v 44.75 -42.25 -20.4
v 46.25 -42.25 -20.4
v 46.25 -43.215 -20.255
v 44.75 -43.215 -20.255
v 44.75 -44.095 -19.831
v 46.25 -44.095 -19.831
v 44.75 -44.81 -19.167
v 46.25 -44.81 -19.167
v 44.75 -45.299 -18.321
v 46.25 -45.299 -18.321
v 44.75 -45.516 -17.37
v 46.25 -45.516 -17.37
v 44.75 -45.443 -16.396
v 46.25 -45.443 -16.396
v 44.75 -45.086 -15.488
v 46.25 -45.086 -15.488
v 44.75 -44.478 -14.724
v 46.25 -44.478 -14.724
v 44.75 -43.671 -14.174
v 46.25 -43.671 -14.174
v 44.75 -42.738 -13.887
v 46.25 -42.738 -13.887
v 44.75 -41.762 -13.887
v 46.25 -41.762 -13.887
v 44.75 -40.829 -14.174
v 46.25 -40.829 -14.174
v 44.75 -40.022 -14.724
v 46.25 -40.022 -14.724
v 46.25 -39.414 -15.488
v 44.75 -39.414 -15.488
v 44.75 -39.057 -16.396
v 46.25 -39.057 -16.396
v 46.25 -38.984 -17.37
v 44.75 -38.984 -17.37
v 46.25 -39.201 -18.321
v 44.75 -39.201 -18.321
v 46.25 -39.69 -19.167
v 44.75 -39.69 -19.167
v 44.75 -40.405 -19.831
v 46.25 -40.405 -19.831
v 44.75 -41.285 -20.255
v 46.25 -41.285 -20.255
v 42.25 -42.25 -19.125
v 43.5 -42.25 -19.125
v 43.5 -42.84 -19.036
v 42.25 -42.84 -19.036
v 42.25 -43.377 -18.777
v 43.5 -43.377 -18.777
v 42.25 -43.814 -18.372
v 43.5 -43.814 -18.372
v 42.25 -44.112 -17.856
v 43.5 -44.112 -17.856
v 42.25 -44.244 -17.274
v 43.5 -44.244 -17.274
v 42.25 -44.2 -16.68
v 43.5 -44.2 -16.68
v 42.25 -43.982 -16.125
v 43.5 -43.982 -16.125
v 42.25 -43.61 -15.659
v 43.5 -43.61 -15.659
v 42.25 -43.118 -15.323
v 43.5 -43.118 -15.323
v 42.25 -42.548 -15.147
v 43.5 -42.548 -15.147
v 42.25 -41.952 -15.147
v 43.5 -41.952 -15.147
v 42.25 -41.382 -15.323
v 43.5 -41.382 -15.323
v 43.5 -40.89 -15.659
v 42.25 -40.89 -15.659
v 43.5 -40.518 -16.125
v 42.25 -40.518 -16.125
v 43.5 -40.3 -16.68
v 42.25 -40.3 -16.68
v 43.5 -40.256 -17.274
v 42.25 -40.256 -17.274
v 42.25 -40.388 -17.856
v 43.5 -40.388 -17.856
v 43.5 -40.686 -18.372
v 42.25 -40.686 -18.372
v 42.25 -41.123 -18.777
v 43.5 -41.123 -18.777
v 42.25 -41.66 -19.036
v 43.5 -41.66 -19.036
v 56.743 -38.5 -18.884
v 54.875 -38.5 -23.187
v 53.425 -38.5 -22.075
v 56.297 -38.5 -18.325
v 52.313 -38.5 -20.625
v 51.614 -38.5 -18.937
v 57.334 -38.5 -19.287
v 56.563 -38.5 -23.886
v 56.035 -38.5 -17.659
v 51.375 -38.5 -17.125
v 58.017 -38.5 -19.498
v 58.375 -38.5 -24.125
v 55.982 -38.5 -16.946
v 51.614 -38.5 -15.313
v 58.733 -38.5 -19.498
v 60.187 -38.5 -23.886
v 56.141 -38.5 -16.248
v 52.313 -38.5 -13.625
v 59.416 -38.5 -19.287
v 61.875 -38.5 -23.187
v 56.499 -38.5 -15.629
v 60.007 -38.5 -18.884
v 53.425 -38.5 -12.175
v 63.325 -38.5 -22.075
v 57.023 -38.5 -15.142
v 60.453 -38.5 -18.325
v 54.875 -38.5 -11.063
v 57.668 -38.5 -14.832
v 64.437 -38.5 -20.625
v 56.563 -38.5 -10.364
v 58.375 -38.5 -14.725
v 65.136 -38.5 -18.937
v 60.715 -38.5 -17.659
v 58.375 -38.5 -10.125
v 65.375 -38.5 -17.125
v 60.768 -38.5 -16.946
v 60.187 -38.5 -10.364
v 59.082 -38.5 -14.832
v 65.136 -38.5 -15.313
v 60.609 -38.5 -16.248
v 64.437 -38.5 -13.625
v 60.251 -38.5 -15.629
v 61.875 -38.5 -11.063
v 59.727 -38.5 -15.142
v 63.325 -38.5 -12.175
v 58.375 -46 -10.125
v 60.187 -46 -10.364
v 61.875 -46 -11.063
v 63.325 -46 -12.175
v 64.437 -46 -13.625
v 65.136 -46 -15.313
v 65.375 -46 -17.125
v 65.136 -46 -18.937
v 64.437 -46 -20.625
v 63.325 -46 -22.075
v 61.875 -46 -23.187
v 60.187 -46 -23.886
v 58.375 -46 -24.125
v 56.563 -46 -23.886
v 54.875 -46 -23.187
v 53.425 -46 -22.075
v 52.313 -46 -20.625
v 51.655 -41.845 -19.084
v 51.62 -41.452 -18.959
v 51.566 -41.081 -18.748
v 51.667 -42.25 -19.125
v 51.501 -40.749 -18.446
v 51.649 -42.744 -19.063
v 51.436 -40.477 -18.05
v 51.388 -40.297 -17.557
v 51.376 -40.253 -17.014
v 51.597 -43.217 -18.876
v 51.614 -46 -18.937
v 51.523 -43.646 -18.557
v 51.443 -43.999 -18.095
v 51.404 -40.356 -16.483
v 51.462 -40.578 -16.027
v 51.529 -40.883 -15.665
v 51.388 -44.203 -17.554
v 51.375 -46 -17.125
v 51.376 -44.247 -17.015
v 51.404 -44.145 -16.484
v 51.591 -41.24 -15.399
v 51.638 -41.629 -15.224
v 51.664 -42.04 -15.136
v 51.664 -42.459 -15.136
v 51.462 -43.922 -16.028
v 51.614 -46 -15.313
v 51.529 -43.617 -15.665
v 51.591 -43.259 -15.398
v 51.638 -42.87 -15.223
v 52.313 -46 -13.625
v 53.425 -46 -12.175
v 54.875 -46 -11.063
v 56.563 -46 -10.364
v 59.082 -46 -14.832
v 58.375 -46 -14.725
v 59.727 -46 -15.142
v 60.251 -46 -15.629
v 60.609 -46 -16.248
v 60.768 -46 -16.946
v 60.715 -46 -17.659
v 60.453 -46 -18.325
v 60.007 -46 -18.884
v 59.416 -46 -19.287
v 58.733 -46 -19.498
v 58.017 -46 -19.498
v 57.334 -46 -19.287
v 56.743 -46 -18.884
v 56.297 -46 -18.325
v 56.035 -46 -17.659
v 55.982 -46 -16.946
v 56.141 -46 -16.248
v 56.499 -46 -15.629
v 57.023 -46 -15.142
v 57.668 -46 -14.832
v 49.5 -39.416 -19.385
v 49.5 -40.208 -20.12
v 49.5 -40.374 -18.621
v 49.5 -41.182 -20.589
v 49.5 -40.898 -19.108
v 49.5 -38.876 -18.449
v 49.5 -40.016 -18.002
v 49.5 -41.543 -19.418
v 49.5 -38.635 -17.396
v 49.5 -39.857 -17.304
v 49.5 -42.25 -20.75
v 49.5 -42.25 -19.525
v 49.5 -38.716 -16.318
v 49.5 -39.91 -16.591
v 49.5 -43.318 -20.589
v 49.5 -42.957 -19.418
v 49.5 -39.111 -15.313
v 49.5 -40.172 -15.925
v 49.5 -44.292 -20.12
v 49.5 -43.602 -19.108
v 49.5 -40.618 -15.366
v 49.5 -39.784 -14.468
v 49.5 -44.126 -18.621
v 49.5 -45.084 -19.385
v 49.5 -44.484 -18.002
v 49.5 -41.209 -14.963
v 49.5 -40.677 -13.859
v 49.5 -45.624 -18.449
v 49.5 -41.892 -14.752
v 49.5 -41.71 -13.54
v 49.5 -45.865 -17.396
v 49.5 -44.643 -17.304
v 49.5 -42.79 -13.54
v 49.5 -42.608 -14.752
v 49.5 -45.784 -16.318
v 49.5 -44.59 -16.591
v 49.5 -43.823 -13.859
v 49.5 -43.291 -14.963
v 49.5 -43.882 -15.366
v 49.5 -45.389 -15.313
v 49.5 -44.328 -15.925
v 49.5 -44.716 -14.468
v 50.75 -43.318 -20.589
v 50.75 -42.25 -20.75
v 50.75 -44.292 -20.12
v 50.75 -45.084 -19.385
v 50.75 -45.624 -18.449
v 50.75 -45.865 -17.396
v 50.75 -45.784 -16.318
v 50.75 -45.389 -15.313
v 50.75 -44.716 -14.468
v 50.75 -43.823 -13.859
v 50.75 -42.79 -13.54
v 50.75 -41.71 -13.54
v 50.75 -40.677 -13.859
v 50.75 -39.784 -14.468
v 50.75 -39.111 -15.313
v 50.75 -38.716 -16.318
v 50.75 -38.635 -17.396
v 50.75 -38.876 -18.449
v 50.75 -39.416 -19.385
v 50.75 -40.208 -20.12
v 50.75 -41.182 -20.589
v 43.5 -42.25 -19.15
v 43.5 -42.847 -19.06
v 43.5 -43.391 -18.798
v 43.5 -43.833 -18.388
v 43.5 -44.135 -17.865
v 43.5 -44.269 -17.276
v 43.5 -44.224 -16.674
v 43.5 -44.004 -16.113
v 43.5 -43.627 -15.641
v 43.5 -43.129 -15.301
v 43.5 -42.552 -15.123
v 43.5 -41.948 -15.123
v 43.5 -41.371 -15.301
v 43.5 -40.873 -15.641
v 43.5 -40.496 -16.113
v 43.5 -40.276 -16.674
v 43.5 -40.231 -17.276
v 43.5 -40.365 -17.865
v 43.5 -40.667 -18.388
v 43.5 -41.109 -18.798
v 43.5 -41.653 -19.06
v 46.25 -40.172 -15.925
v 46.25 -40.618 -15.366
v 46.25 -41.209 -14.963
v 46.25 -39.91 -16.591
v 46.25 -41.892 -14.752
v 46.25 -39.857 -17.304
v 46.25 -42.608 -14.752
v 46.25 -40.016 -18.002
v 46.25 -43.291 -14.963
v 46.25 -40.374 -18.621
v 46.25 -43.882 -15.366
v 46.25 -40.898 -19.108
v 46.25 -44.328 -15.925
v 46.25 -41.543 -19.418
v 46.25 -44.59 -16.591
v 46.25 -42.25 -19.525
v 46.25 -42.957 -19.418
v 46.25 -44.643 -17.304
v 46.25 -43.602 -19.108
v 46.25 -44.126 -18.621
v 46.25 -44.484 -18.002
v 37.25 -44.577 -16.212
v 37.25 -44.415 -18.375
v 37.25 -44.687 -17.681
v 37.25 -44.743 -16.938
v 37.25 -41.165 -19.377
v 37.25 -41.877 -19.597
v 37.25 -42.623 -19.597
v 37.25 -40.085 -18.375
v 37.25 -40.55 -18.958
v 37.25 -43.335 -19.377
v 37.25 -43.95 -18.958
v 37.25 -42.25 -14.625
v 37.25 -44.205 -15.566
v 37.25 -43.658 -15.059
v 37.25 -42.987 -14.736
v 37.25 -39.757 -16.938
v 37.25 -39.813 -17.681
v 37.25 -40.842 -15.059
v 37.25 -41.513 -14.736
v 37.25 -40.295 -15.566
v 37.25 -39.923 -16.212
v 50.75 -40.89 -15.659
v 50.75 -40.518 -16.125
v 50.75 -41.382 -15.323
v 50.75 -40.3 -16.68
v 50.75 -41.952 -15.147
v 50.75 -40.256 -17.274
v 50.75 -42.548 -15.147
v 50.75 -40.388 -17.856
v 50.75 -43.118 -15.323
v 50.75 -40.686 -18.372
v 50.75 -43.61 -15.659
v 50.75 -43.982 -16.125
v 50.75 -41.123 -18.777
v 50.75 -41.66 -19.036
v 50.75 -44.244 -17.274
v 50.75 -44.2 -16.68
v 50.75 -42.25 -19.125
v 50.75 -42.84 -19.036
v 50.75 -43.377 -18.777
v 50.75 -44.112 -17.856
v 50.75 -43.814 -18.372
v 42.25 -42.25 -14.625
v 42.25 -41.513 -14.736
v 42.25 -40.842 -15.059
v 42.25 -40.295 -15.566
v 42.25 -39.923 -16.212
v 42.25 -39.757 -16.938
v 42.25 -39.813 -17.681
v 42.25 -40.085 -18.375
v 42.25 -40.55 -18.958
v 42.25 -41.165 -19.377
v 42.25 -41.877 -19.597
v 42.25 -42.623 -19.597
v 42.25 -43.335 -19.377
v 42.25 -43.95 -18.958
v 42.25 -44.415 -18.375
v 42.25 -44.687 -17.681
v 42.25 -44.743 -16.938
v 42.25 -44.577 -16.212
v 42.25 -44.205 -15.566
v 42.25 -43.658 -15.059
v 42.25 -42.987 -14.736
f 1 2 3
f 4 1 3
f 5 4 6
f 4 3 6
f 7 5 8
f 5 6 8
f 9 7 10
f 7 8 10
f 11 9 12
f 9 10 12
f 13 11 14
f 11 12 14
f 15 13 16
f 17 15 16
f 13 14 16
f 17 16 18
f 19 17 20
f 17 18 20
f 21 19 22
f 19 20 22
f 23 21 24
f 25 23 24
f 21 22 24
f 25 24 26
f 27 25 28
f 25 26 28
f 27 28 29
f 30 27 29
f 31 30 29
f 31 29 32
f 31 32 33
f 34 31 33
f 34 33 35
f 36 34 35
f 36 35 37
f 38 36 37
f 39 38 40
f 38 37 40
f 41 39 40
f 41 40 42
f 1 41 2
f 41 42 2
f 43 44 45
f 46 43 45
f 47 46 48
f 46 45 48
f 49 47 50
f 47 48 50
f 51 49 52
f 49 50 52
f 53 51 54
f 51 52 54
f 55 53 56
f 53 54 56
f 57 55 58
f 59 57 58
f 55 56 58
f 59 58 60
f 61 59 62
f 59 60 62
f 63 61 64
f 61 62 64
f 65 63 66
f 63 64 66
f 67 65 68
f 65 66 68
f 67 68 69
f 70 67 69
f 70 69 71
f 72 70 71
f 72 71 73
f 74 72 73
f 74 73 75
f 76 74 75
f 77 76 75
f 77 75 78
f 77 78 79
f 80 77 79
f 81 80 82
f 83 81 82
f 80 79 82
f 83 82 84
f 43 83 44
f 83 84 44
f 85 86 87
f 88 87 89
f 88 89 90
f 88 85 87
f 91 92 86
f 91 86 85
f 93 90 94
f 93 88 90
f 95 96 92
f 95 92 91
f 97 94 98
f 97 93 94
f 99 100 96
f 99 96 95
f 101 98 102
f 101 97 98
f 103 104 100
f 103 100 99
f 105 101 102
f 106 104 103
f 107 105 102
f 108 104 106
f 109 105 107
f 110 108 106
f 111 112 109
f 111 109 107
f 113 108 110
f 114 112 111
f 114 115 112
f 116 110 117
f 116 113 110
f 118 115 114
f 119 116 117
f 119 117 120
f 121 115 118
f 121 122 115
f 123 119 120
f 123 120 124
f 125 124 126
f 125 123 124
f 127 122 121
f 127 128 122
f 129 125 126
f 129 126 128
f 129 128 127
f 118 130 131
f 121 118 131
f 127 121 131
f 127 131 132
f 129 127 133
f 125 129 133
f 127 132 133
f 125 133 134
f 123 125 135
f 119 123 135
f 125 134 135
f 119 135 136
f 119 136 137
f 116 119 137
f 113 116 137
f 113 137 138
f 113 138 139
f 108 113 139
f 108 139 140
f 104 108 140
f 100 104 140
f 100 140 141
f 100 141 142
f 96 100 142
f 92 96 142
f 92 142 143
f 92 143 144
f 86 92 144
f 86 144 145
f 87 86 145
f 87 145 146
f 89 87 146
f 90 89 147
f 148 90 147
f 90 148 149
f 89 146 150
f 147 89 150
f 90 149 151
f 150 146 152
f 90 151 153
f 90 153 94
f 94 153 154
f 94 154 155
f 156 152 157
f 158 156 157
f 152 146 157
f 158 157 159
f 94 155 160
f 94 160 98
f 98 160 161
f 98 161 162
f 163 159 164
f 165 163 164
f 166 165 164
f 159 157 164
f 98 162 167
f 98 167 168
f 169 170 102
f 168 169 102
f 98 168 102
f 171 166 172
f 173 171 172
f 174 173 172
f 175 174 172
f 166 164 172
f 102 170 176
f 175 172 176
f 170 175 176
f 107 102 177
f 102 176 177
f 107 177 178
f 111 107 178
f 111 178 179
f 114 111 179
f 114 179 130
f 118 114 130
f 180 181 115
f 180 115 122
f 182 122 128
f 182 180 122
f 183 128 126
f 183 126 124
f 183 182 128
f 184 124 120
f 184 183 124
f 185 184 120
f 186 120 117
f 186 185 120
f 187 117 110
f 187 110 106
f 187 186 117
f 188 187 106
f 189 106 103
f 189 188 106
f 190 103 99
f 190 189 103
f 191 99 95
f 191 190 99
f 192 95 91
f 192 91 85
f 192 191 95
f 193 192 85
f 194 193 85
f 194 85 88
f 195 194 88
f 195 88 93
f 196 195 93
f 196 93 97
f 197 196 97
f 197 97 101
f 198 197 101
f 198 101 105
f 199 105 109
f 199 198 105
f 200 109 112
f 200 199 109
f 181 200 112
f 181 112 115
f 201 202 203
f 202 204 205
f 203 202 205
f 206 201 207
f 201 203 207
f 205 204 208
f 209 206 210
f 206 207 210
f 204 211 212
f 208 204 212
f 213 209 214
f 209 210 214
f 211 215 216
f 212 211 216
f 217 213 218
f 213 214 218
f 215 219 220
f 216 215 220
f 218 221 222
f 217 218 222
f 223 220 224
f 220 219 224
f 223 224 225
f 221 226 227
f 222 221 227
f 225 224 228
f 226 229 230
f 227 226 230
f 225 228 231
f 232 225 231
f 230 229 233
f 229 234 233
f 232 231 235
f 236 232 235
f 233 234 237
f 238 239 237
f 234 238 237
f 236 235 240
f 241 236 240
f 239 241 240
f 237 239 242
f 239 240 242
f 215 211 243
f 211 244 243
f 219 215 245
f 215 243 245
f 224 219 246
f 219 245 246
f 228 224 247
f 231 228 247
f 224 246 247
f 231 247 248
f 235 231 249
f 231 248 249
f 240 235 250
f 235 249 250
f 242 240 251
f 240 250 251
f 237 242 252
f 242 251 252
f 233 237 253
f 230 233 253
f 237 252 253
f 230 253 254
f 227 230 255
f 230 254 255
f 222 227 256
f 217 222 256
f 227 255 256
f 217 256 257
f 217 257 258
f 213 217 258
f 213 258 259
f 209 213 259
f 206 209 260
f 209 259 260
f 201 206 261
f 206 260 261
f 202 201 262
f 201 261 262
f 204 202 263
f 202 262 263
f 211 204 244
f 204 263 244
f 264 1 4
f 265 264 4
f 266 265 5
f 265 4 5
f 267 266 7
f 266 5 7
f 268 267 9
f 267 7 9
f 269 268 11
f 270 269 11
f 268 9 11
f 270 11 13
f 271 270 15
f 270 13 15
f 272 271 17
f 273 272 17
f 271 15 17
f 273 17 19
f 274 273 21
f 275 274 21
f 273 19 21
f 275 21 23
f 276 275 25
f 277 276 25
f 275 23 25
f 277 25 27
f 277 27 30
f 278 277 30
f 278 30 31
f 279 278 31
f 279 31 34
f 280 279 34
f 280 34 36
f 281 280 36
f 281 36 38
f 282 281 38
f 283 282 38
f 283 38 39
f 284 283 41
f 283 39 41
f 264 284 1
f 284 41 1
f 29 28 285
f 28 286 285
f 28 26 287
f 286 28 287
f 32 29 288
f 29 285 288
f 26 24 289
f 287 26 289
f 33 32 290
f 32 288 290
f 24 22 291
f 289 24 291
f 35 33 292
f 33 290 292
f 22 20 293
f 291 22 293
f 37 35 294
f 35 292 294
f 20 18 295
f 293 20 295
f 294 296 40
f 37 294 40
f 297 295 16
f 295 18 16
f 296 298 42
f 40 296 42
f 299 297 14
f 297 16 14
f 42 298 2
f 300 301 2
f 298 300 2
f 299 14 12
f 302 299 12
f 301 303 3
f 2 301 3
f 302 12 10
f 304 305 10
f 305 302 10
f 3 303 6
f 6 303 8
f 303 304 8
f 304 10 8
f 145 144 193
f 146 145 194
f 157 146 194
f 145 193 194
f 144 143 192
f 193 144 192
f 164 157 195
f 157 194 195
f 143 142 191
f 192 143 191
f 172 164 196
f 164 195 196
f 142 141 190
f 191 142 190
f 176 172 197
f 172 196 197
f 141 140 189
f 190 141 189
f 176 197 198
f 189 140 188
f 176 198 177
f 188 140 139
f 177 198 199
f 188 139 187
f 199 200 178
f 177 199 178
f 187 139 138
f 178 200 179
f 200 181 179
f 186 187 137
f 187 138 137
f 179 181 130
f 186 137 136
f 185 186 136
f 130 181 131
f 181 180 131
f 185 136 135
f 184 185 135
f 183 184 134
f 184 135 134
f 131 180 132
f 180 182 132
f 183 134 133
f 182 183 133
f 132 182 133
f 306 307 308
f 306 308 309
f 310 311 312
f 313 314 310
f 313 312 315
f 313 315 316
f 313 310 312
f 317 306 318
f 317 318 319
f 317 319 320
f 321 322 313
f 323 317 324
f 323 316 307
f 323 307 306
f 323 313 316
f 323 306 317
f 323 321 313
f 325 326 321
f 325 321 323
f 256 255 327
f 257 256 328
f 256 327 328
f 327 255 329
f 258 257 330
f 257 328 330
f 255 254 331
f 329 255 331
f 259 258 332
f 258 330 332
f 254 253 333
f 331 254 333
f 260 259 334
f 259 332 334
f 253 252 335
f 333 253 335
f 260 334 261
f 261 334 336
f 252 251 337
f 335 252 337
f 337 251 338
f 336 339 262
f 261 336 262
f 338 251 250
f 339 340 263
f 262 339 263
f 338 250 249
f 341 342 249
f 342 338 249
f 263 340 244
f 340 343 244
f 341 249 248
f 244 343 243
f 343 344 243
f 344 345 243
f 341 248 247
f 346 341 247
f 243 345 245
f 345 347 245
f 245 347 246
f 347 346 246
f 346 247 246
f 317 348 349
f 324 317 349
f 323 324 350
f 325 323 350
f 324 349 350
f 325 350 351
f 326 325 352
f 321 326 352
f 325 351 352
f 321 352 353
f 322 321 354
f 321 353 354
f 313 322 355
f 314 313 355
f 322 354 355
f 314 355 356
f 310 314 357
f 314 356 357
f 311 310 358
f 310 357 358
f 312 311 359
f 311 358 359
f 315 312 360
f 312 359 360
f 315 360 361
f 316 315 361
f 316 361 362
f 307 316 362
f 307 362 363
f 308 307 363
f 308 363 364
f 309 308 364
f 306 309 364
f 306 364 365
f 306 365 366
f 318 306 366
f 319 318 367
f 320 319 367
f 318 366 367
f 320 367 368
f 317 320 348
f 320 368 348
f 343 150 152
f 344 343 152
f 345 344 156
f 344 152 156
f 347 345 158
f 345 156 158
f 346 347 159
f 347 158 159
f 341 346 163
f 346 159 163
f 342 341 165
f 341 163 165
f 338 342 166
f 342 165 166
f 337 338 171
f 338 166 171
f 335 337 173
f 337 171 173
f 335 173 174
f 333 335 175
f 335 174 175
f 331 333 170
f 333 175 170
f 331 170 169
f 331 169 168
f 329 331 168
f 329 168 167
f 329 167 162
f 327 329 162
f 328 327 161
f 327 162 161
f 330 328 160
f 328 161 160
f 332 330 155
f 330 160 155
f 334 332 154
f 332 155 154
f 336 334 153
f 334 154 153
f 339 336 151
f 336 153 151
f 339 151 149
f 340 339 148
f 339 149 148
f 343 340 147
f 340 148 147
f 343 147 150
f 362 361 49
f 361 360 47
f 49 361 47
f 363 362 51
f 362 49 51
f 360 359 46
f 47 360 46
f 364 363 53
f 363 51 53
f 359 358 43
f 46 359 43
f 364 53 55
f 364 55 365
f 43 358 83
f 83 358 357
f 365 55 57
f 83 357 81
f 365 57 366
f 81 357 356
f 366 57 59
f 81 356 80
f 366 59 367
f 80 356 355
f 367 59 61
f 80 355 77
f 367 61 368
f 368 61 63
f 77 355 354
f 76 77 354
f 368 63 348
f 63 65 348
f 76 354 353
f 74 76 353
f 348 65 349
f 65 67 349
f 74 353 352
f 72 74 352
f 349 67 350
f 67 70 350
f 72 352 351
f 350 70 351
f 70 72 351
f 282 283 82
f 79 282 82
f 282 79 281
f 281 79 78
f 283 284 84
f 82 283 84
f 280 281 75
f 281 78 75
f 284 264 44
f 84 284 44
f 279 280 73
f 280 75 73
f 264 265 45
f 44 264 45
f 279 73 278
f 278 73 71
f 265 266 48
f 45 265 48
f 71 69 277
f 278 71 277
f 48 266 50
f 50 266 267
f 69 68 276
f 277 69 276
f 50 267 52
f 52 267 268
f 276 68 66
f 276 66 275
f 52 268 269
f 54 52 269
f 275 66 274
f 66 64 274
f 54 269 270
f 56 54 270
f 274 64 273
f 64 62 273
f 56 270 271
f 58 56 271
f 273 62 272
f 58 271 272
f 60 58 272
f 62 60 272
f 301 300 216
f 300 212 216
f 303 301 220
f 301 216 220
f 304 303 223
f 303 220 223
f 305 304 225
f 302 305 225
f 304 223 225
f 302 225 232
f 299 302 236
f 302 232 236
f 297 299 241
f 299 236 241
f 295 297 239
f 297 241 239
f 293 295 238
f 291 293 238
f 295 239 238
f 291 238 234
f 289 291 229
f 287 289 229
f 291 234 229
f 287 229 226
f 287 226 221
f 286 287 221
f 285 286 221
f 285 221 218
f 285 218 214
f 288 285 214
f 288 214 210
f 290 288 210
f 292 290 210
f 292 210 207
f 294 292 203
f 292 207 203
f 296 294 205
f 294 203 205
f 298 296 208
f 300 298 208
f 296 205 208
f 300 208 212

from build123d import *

# Parameters (mm, degrees)
SKETCH_2_R      = 7
SKETCH_2_R_2    = 2.4
EXTRUDE_1_DEPTH = 7.5
SKETCH_4_R      = 2
EXTRUDE_3_DEPTH = 1.25
SKETCH_5_R      = 2.5
SKETCH_5_R_2    = 2
EXTRUDE_4_DEPTH = 5
CHAMFER_1_SIZE  = 1.25


with BuildPart() as part:
    # 草图1 → 旋转1 (revolve)
    with BuildSketch(Plane(origin=(0, -42.25, 0), x_dir=(1, 0, 0), z_dir=(0, 1, 0)), mode=Mode.PRIVATE) as revolve_1_sk:
        Polygon((53.274875926, 15.125), (53.274875926, 17.125), (43.5, 17.125), (43.5, 13.85), (46.25, 13.85), (46.25, 14.725), (49.5, 14.725), (49.5, 13.5), (50.75, 13.5), (50.75, 15.125), align=None)
    revolve(revolve_1_sk.sketch.rotate(Axis((58.375, -42.25, -17.125), (-1, 0, 0)), 180), axis=Axis((58.375, -42.25, -17.125), (-1, 0, 0)))

    # 草图2 → 凸台-拉伸1 (add)
    with BuildSketch(Plane(origin=(0, -46, 0), x_dir=(1, 0, 0), z_dir=(0, 1, 0))):
        with Locations(Location((58.375, 17.125, 0), (0, 0, 270))):
            Circle(SKETCH_2_R)
        with Locations(Location((58.375, 17.125, 0), (0, 0, 270))):
            Circle(SKETCH_2_R_2, mode=Mode.SUBTRACT)
    extrude(amount=EXTRUDE_1_DEPTH)

    # 草图4 → 凸台-拉伸3 (add)
    with BuildSketch(Plane.ZY.offset(-43.5)):
        with Locations(Location((-17.125, -42.25, 0), (0, 0, 180))):
            Circle(SKETCH_4_R)
    extrude(amount=EXTRUDE_3_DEPTH)

    # 草图5 → 凸台-拉伸4 (add)
    # profile 1 of 2: a face of its own
    with BuildSketch(Plane.ZY.offset(-42.25)):
        with Locations((-17.125, -42.25)):
            Circle(SKETCH_5_R)
        with Locations(Location((-17.125, -42.25, 0), (0, 0, 180))):
            Circle(SKETCH_5_R_2, mode=Mode.SUBTRACT)
    # profile 2 of 2: a face of its own
    with BuildSketch(Plane.ZY.offset(-42.25)):
        with Locations(Location((-17.125, -42.25, 0), (0, 0, 180))):
            Circle(SKETCH_5_R_2)
    extrude(amount=EXTRUDE_4_DEPTH)

    # 倒角1
    chamfer_1_edges = [part.edges().sort_by_distance(p)[0] for p in [
        (43.5, -42.25, -13.85),
    ]]
    chamfer(chamfer_1_edges, length=CHAMFER_1_SIZE)


solid = part.part
